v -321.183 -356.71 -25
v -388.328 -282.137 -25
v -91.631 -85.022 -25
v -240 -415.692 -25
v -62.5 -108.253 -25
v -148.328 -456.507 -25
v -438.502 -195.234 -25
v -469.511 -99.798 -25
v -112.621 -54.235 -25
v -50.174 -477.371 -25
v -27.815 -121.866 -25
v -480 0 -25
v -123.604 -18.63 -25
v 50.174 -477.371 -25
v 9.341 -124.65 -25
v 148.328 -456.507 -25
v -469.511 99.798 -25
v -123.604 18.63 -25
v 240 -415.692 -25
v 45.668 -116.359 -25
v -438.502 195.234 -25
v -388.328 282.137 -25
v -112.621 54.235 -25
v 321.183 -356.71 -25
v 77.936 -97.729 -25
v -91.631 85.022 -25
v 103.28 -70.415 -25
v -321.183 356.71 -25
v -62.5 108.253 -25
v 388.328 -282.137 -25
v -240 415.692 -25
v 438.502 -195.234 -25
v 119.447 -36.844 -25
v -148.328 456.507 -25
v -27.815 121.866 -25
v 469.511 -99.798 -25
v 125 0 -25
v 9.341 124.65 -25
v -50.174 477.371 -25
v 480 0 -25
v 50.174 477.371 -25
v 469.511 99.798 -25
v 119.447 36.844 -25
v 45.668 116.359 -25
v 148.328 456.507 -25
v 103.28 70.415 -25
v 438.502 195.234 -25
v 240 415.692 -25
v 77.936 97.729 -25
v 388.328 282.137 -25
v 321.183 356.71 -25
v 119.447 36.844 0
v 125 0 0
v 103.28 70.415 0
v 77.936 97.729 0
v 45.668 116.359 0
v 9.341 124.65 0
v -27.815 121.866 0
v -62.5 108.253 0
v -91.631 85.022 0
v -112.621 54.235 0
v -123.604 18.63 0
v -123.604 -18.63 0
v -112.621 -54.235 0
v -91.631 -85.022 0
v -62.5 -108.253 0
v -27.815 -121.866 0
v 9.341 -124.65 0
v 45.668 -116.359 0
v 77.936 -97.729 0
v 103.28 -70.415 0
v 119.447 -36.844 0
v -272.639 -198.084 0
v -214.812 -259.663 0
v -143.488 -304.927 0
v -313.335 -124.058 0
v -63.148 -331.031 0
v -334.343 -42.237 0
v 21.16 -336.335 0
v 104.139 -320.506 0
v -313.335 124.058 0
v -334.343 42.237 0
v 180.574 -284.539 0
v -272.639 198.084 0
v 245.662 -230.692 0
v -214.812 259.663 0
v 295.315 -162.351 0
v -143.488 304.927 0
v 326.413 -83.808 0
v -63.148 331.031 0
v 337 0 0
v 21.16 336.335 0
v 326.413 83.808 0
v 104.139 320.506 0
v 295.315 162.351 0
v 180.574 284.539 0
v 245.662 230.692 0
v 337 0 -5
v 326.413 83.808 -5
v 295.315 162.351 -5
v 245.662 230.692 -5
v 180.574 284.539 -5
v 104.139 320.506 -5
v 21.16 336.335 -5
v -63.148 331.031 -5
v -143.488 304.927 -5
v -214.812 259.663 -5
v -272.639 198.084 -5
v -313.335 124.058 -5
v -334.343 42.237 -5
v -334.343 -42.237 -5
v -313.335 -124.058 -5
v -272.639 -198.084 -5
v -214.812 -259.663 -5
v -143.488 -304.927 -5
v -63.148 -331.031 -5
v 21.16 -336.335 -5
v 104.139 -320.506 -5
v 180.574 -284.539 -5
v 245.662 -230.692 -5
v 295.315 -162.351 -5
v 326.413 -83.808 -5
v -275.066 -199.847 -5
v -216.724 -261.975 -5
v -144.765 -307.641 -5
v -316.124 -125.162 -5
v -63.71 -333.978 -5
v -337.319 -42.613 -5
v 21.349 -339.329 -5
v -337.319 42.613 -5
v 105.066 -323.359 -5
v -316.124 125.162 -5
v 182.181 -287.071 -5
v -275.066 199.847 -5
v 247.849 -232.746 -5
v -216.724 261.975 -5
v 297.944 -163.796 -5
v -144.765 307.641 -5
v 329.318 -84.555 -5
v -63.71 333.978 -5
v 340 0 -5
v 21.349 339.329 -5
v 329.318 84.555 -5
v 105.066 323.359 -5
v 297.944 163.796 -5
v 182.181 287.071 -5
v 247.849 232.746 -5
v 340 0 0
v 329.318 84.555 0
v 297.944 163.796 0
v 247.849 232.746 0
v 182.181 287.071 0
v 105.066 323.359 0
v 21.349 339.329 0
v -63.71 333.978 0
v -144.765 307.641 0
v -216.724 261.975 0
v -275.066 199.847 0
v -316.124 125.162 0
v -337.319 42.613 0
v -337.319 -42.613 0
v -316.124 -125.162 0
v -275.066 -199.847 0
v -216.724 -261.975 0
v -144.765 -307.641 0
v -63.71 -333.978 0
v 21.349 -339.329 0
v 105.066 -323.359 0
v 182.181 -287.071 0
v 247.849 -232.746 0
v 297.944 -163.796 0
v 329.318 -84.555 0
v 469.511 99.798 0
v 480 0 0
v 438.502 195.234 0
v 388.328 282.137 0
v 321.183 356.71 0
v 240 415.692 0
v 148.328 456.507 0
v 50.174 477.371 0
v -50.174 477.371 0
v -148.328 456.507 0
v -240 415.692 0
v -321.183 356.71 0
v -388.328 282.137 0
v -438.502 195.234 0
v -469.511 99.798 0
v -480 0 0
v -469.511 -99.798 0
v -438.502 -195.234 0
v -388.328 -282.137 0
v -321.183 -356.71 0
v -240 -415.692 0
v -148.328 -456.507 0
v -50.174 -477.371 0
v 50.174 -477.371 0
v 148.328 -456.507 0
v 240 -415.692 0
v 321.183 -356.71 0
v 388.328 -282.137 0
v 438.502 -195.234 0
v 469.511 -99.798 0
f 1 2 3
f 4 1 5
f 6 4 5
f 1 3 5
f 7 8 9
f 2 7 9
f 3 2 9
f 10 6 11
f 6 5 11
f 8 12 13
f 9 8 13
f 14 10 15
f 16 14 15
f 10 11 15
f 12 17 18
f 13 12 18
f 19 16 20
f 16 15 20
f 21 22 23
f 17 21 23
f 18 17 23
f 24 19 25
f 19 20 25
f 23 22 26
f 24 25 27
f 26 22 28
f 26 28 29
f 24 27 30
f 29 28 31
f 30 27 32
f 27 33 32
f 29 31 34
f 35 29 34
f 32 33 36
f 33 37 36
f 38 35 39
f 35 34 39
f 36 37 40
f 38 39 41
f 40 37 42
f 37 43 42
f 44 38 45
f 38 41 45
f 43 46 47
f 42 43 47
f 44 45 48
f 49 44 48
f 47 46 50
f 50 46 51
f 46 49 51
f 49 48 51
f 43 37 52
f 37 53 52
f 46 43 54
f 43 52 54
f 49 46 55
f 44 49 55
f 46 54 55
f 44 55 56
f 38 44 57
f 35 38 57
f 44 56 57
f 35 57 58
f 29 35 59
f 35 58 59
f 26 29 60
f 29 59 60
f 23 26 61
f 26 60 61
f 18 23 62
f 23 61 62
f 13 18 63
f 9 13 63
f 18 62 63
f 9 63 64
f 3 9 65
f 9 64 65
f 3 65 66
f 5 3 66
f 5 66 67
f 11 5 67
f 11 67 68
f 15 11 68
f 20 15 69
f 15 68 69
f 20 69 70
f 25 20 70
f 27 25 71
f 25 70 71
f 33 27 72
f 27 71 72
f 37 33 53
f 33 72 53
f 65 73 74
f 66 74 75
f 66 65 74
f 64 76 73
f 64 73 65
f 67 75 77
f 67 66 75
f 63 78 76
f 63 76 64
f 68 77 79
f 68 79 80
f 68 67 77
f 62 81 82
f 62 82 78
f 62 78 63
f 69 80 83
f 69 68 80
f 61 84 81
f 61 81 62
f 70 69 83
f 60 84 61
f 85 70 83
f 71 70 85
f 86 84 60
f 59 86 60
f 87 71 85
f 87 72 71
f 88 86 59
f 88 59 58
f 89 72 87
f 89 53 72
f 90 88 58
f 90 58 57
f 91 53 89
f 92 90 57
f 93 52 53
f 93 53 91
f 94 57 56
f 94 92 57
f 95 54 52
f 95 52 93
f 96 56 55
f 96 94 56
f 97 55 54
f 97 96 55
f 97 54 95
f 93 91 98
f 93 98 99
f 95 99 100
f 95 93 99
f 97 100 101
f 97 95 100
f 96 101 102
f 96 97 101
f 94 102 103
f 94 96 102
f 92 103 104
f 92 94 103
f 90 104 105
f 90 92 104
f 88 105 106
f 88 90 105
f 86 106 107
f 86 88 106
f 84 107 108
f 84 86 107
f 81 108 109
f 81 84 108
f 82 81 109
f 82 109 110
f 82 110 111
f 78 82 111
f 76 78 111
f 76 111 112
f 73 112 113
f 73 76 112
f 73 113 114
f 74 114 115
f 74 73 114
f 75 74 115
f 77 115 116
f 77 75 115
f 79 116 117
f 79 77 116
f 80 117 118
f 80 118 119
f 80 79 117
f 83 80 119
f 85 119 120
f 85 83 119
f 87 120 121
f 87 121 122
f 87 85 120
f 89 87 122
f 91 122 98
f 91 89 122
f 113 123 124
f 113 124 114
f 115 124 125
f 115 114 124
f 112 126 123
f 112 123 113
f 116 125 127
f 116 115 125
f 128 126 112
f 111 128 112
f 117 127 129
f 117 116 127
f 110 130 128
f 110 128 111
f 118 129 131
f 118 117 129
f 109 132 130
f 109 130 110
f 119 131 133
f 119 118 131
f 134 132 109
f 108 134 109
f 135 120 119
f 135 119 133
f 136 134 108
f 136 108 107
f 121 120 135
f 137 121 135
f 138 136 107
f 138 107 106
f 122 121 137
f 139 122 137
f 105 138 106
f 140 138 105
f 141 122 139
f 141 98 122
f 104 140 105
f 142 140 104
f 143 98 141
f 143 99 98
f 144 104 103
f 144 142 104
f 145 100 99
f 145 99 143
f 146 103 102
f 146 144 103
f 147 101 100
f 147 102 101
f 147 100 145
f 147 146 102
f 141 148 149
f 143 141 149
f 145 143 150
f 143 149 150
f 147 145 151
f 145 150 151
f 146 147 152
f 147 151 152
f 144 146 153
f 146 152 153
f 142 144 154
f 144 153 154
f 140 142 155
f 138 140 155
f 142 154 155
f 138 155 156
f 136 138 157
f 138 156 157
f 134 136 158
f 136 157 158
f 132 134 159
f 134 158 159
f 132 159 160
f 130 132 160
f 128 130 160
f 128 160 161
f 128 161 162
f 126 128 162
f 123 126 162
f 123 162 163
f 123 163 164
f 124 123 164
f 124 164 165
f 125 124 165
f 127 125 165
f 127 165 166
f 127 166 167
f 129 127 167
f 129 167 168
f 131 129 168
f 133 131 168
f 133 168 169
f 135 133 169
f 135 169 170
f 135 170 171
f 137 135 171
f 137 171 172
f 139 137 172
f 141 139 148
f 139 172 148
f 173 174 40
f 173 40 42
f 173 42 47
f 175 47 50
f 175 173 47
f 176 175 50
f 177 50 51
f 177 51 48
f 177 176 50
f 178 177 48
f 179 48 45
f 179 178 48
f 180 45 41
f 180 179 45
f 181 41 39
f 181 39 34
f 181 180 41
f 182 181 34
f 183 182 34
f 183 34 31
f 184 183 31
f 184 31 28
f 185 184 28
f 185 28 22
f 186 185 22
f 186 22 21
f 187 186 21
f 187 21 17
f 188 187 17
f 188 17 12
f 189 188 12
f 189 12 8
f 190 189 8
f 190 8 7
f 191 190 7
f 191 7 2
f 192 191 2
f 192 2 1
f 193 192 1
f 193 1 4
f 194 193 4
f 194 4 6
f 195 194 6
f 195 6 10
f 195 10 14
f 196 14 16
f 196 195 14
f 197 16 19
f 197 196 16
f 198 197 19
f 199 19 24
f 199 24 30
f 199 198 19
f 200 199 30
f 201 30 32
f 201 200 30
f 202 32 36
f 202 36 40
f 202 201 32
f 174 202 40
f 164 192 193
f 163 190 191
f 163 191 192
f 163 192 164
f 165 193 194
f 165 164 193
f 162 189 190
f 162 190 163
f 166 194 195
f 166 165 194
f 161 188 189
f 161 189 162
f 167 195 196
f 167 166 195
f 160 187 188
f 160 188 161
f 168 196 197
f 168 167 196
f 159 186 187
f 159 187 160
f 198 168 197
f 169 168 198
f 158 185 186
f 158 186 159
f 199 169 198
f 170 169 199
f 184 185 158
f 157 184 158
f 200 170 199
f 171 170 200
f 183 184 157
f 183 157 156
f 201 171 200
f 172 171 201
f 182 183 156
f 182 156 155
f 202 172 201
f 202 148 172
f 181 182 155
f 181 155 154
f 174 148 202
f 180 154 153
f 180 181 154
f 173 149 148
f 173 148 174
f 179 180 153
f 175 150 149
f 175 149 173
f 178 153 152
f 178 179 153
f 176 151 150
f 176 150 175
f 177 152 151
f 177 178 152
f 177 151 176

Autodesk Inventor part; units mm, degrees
ref_plane "YZ Plane" through (0, 0, 0) normal (1, 0, 0) x (0, 1, 0)
ref_plane "XZ Plane" through (0, 0, 0) normal (0, 1, 0) x (-1, 0, 0)
ref_plane "XY Plane" through (0, 0, 0) normal (0, 0, 1) x (1, 0, 0)
sketch "Boceto1" plane through (0, 0, 0) normal (0, 0, 1) x (1, 0, 0)
  circle A0 centre (0, 0) radius 125
  circle A1 centre (0, 0) radius 480
  dimension "d0" = 960
  dimension "d1" = 250
extrude "Extrusión1" add sketch "Boceto1" against normal blind 25
sketch "Boceto2" plane through (0, 0, 0) normal (0, 0, 1) x (1, 0, 0)
  circle A0 centre (0, 0) radius 340
  circle A1 centre (0, 0) radius 337
  dimension "d4" = 680
  dimension "d5" = 674
extrude "Extrusión2" cut sketch "Boceto2" against normal blind 5
sketch "Boceto3" plane through (0, 0, 0) normal (0, 0, 1) x (1, 0, 0)
  circle A0 centre (0, 0) radius 332.5 construction
  circle A1 centre (0, 332.5) radius 6
  circle A2 centre (-113.7217, 312.4478) radius 6
  circle A3 centre (-213.7269, 254.7098) radius 6
  circle A4 centre (-287.9534, 166.25) radius 6
  circle A5 centre (-327.4486, 57.738) radius 6
  circle A6 centre (-327.4486, -57.738) radius 6
  circle A7 centre (-287.9534, -166.25) radius 6
  circle A8 centre (-213.7269, -254.7098) radius 6
  circle A9 centre (-113.7217, -312.4478) radius 6
  circle A10 centre (0, -332.5) radius 6
  circle A11 centre (113.7217, -312.4478) radius 6
  circle A12 centre (213.7269, -254.7098) radius 6
  circle A13 centre (287.9534, -166.25) radius 6
  circle A14 centre (327.4486, -57.738) radius 6
  circle A15 centre (327.4486, 57.738) radius 6
  circle A16 centre (287.9534, 166.25) radius 6
  circle A17 centre (213.7269, 254.7098) radius 6
  circle A18 centre (113.7217, 312.4478) radius 6
  dimension "d8" = 665
  dimension "d9" = 12
  dimension "d12" = 360
extrude "Extrusión3" [suppressed]
properties part number "Brida_2 (flange_2) Lebus"
